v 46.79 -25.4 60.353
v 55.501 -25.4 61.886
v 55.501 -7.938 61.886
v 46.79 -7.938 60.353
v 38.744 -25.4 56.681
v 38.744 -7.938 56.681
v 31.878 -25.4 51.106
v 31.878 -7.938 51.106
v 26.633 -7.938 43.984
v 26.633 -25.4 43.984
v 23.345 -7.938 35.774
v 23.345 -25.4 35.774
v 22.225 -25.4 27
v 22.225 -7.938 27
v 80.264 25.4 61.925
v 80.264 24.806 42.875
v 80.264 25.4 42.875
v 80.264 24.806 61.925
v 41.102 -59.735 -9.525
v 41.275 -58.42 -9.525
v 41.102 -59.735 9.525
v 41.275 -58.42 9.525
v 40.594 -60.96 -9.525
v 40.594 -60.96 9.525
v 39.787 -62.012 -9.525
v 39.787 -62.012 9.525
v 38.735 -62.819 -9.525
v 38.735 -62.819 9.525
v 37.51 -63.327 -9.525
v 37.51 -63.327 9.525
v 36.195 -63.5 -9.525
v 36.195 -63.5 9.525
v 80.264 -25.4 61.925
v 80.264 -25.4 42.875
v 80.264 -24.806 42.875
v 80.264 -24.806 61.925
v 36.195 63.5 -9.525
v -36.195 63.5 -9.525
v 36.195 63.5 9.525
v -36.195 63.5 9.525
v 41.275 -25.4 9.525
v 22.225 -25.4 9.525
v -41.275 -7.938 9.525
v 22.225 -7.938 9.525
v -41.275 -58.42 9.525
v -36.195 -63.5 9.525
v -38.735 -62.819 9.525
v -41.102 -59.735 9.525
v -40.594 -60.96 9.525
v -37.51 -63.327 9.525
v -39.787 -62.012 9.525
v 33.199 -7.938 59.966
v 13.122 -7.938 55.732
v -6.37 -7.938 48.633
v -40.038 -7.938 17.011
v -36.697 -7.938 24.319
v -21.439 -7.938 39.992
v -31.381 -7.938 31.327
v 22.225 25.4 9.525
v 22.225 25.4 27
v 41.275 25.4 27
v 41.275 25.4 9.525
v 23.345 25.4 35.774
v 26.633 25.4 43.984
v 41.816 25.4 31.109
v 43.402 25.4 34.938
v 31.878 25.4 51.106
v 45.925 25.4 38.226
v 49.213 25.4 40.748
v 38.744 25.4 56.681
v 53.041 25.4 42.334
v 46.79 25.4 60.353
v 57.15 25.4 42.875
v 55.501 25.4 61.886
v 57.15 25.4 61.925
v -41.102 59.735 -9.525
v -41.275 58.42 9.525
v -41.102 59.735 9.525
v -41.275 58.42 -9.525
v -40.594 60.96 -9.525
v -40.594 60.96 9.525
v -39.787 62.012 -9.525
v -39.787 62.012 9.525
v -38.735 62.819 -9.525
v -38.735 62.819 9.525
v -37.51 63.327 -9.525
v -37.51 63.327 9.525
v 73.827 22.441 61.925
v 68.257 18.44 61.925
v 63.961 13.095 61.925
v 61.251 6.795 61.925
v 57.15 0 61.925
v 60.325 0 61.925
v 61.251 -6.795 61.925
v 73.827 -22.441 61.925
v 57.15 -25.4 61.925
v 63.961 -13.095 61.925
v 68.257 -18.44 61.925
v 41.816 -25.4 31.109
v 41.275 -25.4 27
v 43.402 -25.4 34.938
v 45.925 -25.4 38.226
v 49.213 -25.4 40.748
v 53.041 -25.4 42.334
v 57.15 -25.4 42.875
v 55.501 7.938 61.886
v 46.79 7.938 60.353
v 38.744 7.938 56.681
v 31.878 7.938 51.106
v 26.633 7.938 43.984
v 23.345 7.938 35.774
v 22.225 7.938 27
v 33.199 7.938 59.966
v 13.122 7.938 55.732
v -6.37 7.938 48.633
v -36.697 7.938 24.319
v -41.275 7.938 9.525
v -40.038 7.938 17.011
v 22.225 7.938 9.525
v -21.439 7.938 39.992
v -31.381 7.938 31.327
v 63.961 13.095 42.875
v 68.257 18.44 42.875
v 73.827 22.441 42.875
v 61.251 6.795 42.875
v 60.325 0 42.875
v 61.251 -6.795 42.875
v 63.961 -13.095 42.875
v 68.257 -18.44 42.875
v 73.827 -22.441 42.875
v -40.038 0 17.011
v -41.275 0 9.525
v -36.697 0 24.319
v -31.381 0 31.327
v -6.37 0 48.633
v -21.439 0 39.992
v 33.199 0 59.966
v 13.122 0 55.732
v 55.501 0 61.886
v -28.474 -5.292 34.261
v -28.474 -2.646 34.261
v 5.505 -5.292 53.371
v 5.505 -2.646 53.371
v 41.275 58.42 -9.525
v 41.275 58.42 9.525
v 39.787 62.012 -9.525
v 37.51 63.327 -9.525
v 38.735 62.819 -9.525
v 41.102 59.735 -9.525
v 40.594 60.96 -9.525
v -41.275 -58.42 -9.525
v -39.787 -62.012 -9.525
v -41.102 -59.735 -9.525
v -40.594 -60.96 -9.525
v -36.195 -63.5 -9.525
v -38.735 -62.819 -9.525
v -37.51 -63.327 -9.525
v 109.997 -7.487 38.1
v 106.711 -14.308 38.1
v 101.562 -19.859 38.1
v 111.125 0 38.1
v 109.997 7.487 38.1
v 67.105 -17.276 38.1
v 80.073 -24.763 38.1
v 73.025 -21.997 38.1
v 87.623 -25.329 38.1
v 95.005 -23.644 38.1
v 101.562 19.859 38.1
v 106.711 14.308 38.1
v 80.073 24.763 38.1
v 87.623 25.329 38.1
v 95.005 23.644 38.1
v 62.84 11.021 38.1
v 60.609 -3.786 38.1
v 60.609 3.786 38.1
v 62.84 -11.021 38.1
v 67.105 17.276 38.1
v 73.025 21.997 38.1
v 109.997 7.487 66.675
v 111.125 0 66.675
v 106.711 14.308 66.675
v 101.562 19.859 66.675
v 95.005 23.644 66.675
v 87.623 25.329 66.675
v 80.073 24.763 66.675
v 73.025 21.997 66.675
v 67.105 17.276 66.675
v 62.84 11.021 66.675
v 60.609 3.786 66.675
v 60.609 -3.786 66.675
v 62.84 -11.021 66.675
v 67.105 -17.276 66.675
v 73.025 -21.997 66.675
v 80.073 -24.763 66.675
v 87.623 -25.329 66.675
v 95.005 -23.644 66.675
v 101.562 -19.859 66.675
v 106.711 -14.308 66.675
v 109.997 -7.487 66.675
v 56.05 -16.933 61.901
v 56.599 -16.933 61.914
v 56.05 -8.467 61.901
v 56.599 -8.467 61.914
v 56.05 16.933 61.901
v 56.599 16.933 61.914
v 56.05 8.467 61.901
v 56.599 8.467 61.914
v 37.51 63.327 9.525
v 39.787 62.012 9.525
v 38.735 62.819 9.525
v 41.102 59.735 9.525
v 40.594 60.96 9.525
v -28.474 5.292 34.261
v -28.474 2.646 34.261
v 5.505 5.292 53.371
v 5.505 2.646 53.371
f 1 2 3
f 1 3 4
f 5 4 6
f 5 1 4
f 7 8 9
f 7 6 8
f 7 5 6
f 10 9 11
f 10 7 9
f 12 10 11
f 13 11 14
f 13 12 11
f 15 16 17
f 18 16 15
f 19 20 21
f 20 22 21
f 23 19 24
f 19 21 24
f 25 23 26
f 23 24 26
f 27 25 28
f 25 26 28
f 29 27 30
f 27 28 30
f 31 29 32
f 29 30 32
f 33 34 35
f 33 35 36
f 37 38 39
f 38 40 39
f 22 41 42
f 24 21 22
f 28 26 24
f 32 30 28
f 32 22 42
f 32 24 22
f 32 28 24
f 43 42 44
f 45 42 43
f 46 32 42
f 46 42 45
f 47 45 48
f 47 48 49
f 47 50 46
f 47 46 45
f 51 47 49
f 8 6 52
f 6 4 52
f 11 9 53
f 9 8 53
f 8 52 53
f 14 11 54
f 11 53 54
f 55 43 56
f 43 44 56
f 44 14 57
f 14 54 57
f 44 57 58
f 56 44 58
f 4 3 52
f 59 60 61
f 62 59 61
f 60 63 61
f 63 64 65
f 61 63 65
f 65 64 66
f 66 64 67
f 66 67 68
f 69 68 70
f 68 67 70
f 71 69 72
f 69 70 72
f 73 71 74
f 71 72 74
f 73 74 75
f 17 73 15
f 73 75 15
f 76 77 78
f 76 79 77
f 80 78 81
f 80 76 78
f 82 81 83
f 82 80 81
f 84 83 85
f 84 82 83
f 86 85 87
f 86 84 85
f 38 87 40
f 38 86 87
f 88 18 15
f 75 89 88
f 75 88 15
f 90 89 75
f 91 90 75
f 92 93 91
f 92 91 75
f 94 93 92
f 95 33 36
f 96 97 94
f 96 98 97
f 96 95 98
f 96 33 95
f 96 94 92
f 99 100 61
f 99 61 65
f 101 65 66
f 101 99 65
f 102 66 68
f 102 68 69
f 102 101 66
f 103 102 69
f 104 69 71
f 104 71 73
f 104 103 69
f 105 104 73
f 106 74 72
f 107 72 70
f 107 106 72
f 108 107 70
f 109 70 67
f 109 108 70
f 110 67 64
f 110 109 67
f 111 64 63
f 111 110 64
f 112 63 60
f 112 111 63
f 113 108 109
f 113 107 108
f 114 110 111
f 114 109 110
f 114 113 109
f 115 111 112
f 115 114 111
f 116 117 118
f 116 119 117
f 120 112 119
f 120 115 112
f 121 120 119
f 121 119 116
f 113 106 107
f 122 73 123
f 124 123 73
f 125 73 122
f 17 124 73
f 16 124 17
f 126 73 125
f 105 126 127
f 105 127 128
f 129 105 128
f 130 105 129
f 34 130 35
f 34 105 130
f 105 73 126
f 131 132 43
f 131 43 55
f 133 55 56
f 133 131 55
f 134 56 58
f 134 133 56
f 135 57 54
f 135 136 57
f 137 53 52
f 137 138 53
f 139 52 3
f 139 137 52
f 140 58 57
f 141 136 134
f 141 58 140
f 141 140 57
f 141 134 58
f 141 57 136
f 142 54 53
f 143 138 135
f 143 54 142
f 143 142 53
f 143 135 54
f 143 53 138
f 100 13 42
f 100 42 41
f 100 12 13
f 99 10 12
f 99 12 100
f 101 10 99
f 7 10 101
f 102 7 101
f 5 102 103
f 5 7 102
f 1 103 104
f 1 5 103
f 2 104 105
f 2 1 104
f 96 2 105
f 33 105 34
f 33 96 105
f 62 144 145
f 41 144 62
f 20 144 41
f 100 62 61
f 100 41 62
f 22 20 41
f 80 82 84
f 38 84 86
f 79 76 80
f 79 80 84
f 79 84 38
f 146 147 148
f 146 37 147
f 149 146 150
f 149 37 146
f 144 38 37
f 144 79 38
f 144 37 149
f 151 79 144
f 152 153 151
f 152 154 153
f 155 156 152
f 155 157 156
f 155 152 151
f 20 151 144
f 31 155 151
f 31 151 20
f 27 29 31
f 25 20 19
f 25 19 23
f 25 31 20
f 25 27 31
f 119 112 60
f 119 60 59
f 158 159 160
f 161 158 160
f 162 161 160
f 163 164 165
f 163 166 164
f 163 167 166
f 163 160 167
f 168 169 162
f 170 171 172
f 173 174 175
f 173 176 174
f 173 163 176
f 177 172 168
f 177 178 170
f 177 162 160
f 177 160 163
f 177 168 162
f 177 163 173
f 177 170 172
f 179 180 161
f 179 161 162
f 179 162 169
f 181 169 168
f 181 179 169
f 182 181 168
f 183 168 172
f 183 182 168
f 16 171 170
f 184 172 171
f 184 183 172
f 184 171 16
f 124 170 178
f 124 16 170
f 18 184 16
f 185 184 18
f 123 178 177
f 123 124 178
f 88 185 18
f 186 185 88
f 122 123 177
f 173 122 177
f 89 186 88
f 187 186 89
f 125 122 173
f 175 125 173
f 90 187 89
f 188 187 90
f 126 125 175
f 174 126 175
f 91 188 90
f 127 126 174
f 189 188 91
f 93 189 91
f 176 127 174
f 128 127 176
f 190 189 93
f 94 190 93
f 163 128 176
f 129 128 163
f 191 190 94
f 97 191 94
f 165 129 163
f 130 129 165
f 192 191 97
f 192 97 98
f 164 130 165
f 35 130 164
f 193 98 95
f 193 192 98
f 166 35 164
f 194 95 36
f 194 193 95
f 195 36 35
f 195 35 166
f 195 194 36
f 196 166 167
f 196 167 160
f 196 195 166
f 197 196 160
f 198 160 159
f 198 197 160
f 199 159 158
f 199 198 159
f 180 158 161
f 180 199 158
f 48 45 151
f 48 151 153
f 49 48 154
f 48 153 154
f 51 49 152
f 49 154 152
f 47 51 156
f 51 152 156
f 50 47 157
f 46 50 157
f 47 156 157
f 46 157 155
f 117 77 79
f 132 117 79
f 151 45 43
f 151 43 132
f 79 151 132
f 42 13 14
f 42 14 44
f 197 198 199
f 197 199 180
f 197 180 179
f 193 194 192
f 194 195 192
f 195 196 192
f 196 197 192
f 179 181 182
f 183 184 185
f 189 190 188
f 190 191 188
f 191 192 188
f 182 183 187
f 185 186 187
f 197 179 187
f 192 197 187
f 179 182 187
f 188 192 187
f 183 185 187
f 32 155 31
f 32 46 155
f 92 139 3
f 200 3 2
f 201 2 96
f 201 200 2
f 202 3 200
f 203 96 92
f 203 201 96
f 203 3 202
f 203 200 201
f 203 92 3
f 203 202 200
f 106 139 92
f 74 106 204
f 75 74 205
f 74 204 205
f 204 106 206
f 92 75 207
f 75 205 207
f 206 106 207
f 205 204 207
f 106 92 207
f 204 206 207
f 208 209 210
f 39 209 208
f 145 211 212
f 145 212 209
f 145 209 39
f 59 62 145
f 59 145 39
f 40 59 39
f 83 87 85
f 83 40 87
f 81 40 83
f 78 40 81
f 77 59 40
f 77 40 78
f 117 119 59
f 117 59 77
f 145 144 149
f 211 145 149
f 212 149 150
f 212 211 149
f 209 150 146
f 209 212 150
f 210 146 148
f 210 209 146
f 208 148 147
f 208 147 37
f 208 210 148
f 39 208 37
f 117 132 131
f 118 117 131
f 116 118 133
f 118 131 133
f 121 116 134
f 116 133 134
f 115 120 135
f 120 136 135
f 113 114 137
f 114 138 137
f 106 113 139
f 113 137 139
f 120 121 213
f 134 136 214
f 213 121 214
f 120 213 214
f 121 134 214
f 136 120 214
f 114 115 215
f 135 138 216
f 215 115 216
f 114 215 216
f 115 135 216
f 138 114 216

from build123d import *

# Parameters (mm, degrees)
F1_DEPTH = 63.5
F0_W     = 19.9390054388
F0_H     = 19.0500000358
F2_DEPTH = 25.4
F3_DEPTH = 7.9375
F0_W_2   = 25.4
F0_H_2   = 28.575
F5_R     = 5.08


with BuildPart() as f1:
    # F0 (on Front) → F1 (new body, symmetric)
    with BuildSketch(Plane.XZ):
        Polygon((22.2249999642, 9.525), (-41.275, 9.525), (-41.275, -9.525), (41.275, -9.525), (41.275, 9.525), align=None)
    extrude(amount=F1_DEPTH, both=True)

    # F0 (on Front) → F2 (join, symmetric)
    with BuildSketch(Plane.XZ):
        with BuildLine():
            Line((22.2249999642, 27.0002), (22.2249999642, 9.525))
            Line((22.2249999642, 9.525), (41.275, 9.525))
            Line((41.275, 9.525), (41.275, 27.0002))
            ThreePointArc((41.275, 27.0002), (45.9246798487, 38.2255201513), (57.15, 42.8752))
            Line((57.15, 42.8752), (60.325, 42.8752))
            Line((60.325, 42.8752), (60.325, 61.9252000358))
            Line((60.325, 61.9252000358), (57.15, 61.9252000358))
            add(Edge.make_bspline(
                [(55.5009997986, 61.8862491577), (56.0491292612, 61.9014539237), (56.5988031448, 61.9144444348), (57.15, 61.9252000358)],
                knots=[110.4291039898, 110.4291039898, 110.4291039898, 110.4291039898, 111.5045361803, 111.5045361803, 111.5045361803, 111.5045361803], degree=3))
            ThreePointArc((55.5009997986, 61.8862491577), (31.8780099756, 51.1058455566), (22.2249999642, 27.0002))
        make_face()
        with Locations((70.2945027194, 52.4002000179)):
            Rectangle(F0_W, F0_H)
    extrude(amount=F2_DEPTH, both=True)

    # F0 (on Front) → F3 (join, symmetric)
    with BuildSketch(Plane.XZ):
        with BuildLine():
            add(Edge.make_bspline(
                [(-41.275, 9.525), (-40.7824539229, 35.4168247644), (-0.7828328366, 60.3249711005), (55.5009997986, 61.8862491577)],
                knots=[0, 0, 0, 0, 110.4291039898, 110.4291039898, 110.4291039898, 110.4291039898], degree=3))
            Line((-41.275, 9.525), (22.2249999642, 9.525))
            Line((22.2249999642, 9.525), (22.2249999642, 27.0002))
            ThreePointArc((22.2249999642, 27.0002), (31.8780099756, 51.1058455566), (55.5009997986, 61.8862491577))
        make_face()
    extrude(amount=F3_DEPTH, both=True)

    # F0 (on Front) → F4 (revolve)
    with BuildSketch(Plane.XZ):
        with Locations((98.425, 52.3875)):
            Rectangle(F0_W_2, F0_H_2)
    revolve(axis=Axis((85.725, 0, 52.3875), (0, 0, 1)))

    # F5
    f5_edges = [f1.edges().sort_by_distance(p)[0] for p in [
        (-41.275, -63.5, 0),
        (41.275, -63.5, 0),
        (41.275, 63.5, 0),
        (-41.275, 63.5, 0),
    ]]
    fillet(f5_edges, radius=F5_R)


solid = f1.part
